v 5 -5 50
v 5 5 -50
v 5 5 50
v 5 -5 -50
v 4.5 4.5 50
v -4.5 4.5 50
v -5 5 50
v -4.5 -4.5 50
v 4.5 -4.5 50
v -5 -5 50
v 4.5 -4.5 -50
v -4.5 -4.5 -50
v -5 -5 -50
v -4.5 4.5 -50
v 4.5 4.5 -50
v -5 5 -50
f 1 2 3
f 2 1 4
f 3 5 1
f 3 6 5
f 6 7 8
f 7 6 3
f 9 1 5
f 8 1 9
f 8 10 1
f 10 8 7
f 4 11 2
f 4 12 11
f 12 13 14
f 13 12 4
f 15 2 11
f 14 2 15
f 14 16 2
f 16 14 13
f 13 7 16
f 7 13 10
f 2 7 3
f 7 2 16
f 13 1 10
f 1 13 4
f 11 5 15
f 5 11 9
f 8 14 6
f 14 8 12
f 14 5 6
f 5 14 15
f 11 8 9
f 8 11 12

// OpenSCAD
module aluminium_extrusion() {
    difference() {
        cube([10, 10, 100], center = true);
        translate([-4.5, -4.5, -50])
            cube([9, 9, 100]);
    }
}

aluminium_extrusion();
